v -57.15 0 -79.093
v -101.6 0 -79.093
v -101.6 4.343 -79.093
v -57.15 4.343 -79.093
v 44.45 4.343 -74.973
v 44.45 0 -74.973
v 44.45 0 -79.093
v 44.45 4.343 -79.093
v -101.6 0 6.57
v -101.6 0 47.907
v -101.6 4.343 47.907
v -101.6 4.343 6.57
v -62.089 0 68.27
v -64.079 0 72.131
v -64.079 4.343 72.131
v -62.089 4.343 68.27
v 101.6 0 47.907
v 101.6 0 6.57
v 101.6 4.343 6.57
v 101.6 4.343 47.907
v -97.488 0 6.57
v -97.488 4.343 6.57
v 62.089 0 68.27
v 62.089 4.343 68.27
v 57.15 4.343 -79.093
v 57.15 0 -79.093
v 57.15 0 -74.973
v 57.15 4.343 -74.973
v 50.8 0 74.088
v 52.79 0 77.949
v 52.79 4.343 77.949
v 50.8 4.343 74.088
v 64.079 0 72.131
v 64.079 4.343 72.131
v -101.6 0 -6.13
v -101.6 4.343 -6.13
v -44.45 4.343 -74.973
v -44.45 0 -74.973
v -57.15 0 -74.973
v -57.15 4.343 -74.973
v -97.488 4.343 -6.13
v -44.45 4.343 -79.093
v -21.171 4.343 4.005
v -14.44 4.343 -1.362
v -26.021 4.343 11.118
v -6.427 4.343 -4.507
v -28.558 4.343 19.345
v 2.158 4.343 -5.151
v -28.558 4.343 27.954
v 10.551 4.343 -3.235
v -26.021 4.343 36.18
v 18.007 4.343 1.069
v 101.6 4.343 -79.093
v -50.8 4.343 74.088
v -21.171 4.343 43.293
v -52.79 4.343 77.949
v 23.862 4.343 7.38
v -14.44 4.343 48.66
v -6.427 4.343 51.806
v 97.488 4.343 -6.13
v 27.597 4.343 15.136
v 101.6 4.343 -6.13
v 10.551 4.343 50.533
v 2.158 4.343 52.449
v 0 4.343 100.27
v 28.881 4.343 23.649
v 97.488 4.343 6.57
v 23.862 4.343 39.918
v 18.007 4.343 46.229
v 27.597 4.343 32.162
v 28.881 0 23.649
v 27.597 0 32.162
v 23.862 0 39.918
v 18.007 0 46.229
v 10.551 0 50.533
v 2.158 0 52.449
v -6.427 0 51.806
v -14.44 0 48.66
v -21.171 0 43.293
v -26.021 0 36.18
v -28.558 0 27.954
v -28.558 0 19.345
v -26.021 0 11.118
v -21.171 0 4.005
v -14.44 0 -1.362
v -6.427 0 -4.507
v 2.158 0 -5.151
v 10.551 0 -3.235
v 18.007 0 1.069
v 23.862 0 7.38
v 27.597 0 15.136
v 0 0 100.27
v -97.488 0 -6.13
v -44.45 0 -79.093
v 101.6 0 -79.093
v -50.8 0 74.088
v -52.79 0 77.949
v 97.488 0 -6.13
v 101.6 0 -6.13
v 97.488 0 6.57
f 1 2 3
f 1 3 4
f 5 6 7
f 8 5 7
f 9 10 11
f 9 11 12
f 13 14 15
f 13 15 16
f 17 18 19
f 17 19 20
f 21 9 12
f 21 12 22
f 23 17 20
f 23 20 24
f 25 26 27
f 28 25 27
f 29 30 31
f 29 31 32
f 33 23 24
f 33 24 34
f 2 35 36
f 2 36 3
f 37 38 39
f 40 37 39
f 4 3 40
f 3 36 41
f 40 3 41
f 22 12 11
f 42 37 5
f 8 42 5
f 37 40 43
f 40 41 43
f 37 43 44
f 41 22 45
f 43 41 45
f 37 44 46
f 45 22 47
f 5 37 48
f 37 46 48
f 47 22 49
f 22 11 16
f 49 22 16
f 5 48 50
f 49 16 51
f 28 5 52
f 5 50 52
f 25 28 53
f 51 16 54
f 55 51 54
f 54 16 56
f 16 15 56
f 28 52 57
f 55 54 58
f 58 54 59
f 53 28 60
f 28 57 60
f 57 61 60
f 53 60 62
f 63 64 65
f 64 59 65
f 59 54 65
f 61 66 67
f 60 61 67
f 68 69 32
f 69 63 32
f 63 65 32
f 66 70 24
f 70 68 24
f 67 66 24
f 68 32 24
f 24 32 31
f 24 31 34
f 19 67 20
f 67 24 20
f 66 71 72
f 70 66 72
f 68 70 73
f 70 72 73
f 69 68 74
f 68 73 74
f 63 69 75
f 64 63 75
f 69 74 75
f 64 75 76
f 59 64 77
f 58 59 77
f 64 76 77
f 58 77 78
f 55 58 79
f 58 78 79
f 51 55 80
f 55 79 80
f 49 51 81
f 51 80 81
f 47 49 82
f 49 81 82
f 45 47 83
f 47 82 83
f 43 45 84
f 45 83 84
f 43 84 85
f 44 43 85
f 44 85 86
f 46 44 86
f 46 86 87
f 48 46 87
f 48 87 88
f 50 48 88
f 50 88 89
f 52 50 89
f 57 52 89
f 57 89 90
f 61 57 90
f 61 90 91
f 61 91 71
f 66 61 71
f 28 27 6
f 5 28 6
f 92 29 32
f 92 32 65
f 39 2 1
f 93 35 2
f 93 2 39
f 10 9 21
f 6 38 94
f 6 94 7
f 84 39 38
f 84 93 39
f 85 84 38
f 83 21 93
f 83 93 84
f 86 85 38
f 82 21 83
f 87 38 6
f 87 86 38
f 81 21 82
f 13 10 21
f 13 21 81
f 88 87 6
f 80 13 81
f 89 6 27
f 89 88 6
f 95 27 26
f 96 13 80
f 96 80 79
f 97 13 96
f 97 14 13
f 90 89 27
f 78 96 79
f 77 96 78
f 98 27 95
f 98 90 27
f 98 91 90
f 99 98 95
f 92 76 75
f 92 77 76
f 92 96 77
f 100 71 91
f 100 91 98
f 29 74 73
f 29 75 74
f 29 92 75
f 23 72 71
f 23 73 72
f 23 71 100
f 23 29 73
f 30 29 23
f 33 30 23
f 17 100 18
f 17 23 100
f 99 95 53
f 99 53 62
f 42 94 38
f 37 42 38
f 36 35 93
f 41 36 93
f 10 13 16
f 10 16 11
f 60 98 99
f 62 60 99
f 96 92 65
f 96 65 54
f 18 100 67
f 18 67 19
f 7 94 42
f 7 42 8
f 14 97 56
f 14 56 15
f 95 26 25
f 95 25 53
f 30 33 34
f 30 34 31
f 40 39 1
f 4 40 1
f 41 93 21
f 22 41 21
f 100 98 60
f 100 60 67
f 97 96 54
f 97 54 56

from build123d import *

# Parameters (mm, degrees)
F0_W     = 12.7
F0_H     = 4.3434
F1_DEPTH = 4.3434
F2_W     = 4.3434
F2_H     = 12.7
F3_DEPTH = 4.3444
F4_R     = 28.880577
F5_DEPTH = 4.3444
F7_DEPTH = 4.3444


with BuildPart() as f1:
    # F0 (on Front) → F1 (new body)
    with BuildSketch(Plane.XZ):
        Polygon((50.8, 74.088349), (0, 100.27007), (-50.8, 74.088349), (-62.088889, 68.270189), (-101.6, 47.906629), (-101.6, -79.093371), (-57.15, -79.093371), (-57.15, -74.749971), (-44.45, -74.749971), (-44.45, -79.093371), (44.45, -79.093371), (44.45, -74.749971), (57.15, -74.749971), (57.15, -79.093371), (101.6, -79.093371), (101.6, 47.906629), (62.088889, 68.270189), align=None)
        Polygon((-62.088889, 68.270189), (-50.8, 74.088349), (-52.789811, 77.949149), (-64.0787, 72.130989), align=None)
        Polygon((52.789811, 77.949149), (50.8, 74.088349), (62.088889, 68.270189), (64.0787, 72.130989), align=None)
        with Locations((-50.8, -76.921671)):
            Rectangle(F0_W, F0_H)
        Polygon((50.8, -79.093371), (57.15, -79.093371), (57.15, -74.749971), (44.45, -74.749971), (44.45, -79.093371), align=None)
    extrude(amount=-F1_DEPTH)

    # F2 (on Front) → F3 (cut, through all)
    with BuildSketch(Plane.XZ):
        with Locations((-99.660009, 0.220258)):
            Rectangle(F2_W, F2_H)
        with Locations((99.660009, 0.220258)):
            Rectangle(F2_W, F2_H)
    extrude(amount=-F3_DEPTH, mode=Mode.SUBTRACT)

    # F4 (on Front) → F5 (cut, through all)
    with BuildSketch(Plane.XZ):
        with Locations((0, 23.649074)):
            Circle(F4_R)
    extrude(amount=-F5_DEPTH, mode=Mode.SUBTRACT)

    # F6 (on Front) → F7 (cut, through all)
    with BuildSketch(Plane.XZ):
        Polygon((-57.15, -79.316832), (-50.8, -79.316832), (-44.45, -79.316832), (-44.45, -74.973432), (-50.8, -74.973432), (-57.15, -74.973432), align=None)
        Polygon((57.15, -79.316832), (57.15, -74.973432), (50.8, -74.973432), (44.45, -74.973432), (44.45, -79.316832), (50.8, -79.316832), align=None)
    extrude(amount=-F7_DEPTH, mode=Mode.SUBTRACT)


solid = f1.part
